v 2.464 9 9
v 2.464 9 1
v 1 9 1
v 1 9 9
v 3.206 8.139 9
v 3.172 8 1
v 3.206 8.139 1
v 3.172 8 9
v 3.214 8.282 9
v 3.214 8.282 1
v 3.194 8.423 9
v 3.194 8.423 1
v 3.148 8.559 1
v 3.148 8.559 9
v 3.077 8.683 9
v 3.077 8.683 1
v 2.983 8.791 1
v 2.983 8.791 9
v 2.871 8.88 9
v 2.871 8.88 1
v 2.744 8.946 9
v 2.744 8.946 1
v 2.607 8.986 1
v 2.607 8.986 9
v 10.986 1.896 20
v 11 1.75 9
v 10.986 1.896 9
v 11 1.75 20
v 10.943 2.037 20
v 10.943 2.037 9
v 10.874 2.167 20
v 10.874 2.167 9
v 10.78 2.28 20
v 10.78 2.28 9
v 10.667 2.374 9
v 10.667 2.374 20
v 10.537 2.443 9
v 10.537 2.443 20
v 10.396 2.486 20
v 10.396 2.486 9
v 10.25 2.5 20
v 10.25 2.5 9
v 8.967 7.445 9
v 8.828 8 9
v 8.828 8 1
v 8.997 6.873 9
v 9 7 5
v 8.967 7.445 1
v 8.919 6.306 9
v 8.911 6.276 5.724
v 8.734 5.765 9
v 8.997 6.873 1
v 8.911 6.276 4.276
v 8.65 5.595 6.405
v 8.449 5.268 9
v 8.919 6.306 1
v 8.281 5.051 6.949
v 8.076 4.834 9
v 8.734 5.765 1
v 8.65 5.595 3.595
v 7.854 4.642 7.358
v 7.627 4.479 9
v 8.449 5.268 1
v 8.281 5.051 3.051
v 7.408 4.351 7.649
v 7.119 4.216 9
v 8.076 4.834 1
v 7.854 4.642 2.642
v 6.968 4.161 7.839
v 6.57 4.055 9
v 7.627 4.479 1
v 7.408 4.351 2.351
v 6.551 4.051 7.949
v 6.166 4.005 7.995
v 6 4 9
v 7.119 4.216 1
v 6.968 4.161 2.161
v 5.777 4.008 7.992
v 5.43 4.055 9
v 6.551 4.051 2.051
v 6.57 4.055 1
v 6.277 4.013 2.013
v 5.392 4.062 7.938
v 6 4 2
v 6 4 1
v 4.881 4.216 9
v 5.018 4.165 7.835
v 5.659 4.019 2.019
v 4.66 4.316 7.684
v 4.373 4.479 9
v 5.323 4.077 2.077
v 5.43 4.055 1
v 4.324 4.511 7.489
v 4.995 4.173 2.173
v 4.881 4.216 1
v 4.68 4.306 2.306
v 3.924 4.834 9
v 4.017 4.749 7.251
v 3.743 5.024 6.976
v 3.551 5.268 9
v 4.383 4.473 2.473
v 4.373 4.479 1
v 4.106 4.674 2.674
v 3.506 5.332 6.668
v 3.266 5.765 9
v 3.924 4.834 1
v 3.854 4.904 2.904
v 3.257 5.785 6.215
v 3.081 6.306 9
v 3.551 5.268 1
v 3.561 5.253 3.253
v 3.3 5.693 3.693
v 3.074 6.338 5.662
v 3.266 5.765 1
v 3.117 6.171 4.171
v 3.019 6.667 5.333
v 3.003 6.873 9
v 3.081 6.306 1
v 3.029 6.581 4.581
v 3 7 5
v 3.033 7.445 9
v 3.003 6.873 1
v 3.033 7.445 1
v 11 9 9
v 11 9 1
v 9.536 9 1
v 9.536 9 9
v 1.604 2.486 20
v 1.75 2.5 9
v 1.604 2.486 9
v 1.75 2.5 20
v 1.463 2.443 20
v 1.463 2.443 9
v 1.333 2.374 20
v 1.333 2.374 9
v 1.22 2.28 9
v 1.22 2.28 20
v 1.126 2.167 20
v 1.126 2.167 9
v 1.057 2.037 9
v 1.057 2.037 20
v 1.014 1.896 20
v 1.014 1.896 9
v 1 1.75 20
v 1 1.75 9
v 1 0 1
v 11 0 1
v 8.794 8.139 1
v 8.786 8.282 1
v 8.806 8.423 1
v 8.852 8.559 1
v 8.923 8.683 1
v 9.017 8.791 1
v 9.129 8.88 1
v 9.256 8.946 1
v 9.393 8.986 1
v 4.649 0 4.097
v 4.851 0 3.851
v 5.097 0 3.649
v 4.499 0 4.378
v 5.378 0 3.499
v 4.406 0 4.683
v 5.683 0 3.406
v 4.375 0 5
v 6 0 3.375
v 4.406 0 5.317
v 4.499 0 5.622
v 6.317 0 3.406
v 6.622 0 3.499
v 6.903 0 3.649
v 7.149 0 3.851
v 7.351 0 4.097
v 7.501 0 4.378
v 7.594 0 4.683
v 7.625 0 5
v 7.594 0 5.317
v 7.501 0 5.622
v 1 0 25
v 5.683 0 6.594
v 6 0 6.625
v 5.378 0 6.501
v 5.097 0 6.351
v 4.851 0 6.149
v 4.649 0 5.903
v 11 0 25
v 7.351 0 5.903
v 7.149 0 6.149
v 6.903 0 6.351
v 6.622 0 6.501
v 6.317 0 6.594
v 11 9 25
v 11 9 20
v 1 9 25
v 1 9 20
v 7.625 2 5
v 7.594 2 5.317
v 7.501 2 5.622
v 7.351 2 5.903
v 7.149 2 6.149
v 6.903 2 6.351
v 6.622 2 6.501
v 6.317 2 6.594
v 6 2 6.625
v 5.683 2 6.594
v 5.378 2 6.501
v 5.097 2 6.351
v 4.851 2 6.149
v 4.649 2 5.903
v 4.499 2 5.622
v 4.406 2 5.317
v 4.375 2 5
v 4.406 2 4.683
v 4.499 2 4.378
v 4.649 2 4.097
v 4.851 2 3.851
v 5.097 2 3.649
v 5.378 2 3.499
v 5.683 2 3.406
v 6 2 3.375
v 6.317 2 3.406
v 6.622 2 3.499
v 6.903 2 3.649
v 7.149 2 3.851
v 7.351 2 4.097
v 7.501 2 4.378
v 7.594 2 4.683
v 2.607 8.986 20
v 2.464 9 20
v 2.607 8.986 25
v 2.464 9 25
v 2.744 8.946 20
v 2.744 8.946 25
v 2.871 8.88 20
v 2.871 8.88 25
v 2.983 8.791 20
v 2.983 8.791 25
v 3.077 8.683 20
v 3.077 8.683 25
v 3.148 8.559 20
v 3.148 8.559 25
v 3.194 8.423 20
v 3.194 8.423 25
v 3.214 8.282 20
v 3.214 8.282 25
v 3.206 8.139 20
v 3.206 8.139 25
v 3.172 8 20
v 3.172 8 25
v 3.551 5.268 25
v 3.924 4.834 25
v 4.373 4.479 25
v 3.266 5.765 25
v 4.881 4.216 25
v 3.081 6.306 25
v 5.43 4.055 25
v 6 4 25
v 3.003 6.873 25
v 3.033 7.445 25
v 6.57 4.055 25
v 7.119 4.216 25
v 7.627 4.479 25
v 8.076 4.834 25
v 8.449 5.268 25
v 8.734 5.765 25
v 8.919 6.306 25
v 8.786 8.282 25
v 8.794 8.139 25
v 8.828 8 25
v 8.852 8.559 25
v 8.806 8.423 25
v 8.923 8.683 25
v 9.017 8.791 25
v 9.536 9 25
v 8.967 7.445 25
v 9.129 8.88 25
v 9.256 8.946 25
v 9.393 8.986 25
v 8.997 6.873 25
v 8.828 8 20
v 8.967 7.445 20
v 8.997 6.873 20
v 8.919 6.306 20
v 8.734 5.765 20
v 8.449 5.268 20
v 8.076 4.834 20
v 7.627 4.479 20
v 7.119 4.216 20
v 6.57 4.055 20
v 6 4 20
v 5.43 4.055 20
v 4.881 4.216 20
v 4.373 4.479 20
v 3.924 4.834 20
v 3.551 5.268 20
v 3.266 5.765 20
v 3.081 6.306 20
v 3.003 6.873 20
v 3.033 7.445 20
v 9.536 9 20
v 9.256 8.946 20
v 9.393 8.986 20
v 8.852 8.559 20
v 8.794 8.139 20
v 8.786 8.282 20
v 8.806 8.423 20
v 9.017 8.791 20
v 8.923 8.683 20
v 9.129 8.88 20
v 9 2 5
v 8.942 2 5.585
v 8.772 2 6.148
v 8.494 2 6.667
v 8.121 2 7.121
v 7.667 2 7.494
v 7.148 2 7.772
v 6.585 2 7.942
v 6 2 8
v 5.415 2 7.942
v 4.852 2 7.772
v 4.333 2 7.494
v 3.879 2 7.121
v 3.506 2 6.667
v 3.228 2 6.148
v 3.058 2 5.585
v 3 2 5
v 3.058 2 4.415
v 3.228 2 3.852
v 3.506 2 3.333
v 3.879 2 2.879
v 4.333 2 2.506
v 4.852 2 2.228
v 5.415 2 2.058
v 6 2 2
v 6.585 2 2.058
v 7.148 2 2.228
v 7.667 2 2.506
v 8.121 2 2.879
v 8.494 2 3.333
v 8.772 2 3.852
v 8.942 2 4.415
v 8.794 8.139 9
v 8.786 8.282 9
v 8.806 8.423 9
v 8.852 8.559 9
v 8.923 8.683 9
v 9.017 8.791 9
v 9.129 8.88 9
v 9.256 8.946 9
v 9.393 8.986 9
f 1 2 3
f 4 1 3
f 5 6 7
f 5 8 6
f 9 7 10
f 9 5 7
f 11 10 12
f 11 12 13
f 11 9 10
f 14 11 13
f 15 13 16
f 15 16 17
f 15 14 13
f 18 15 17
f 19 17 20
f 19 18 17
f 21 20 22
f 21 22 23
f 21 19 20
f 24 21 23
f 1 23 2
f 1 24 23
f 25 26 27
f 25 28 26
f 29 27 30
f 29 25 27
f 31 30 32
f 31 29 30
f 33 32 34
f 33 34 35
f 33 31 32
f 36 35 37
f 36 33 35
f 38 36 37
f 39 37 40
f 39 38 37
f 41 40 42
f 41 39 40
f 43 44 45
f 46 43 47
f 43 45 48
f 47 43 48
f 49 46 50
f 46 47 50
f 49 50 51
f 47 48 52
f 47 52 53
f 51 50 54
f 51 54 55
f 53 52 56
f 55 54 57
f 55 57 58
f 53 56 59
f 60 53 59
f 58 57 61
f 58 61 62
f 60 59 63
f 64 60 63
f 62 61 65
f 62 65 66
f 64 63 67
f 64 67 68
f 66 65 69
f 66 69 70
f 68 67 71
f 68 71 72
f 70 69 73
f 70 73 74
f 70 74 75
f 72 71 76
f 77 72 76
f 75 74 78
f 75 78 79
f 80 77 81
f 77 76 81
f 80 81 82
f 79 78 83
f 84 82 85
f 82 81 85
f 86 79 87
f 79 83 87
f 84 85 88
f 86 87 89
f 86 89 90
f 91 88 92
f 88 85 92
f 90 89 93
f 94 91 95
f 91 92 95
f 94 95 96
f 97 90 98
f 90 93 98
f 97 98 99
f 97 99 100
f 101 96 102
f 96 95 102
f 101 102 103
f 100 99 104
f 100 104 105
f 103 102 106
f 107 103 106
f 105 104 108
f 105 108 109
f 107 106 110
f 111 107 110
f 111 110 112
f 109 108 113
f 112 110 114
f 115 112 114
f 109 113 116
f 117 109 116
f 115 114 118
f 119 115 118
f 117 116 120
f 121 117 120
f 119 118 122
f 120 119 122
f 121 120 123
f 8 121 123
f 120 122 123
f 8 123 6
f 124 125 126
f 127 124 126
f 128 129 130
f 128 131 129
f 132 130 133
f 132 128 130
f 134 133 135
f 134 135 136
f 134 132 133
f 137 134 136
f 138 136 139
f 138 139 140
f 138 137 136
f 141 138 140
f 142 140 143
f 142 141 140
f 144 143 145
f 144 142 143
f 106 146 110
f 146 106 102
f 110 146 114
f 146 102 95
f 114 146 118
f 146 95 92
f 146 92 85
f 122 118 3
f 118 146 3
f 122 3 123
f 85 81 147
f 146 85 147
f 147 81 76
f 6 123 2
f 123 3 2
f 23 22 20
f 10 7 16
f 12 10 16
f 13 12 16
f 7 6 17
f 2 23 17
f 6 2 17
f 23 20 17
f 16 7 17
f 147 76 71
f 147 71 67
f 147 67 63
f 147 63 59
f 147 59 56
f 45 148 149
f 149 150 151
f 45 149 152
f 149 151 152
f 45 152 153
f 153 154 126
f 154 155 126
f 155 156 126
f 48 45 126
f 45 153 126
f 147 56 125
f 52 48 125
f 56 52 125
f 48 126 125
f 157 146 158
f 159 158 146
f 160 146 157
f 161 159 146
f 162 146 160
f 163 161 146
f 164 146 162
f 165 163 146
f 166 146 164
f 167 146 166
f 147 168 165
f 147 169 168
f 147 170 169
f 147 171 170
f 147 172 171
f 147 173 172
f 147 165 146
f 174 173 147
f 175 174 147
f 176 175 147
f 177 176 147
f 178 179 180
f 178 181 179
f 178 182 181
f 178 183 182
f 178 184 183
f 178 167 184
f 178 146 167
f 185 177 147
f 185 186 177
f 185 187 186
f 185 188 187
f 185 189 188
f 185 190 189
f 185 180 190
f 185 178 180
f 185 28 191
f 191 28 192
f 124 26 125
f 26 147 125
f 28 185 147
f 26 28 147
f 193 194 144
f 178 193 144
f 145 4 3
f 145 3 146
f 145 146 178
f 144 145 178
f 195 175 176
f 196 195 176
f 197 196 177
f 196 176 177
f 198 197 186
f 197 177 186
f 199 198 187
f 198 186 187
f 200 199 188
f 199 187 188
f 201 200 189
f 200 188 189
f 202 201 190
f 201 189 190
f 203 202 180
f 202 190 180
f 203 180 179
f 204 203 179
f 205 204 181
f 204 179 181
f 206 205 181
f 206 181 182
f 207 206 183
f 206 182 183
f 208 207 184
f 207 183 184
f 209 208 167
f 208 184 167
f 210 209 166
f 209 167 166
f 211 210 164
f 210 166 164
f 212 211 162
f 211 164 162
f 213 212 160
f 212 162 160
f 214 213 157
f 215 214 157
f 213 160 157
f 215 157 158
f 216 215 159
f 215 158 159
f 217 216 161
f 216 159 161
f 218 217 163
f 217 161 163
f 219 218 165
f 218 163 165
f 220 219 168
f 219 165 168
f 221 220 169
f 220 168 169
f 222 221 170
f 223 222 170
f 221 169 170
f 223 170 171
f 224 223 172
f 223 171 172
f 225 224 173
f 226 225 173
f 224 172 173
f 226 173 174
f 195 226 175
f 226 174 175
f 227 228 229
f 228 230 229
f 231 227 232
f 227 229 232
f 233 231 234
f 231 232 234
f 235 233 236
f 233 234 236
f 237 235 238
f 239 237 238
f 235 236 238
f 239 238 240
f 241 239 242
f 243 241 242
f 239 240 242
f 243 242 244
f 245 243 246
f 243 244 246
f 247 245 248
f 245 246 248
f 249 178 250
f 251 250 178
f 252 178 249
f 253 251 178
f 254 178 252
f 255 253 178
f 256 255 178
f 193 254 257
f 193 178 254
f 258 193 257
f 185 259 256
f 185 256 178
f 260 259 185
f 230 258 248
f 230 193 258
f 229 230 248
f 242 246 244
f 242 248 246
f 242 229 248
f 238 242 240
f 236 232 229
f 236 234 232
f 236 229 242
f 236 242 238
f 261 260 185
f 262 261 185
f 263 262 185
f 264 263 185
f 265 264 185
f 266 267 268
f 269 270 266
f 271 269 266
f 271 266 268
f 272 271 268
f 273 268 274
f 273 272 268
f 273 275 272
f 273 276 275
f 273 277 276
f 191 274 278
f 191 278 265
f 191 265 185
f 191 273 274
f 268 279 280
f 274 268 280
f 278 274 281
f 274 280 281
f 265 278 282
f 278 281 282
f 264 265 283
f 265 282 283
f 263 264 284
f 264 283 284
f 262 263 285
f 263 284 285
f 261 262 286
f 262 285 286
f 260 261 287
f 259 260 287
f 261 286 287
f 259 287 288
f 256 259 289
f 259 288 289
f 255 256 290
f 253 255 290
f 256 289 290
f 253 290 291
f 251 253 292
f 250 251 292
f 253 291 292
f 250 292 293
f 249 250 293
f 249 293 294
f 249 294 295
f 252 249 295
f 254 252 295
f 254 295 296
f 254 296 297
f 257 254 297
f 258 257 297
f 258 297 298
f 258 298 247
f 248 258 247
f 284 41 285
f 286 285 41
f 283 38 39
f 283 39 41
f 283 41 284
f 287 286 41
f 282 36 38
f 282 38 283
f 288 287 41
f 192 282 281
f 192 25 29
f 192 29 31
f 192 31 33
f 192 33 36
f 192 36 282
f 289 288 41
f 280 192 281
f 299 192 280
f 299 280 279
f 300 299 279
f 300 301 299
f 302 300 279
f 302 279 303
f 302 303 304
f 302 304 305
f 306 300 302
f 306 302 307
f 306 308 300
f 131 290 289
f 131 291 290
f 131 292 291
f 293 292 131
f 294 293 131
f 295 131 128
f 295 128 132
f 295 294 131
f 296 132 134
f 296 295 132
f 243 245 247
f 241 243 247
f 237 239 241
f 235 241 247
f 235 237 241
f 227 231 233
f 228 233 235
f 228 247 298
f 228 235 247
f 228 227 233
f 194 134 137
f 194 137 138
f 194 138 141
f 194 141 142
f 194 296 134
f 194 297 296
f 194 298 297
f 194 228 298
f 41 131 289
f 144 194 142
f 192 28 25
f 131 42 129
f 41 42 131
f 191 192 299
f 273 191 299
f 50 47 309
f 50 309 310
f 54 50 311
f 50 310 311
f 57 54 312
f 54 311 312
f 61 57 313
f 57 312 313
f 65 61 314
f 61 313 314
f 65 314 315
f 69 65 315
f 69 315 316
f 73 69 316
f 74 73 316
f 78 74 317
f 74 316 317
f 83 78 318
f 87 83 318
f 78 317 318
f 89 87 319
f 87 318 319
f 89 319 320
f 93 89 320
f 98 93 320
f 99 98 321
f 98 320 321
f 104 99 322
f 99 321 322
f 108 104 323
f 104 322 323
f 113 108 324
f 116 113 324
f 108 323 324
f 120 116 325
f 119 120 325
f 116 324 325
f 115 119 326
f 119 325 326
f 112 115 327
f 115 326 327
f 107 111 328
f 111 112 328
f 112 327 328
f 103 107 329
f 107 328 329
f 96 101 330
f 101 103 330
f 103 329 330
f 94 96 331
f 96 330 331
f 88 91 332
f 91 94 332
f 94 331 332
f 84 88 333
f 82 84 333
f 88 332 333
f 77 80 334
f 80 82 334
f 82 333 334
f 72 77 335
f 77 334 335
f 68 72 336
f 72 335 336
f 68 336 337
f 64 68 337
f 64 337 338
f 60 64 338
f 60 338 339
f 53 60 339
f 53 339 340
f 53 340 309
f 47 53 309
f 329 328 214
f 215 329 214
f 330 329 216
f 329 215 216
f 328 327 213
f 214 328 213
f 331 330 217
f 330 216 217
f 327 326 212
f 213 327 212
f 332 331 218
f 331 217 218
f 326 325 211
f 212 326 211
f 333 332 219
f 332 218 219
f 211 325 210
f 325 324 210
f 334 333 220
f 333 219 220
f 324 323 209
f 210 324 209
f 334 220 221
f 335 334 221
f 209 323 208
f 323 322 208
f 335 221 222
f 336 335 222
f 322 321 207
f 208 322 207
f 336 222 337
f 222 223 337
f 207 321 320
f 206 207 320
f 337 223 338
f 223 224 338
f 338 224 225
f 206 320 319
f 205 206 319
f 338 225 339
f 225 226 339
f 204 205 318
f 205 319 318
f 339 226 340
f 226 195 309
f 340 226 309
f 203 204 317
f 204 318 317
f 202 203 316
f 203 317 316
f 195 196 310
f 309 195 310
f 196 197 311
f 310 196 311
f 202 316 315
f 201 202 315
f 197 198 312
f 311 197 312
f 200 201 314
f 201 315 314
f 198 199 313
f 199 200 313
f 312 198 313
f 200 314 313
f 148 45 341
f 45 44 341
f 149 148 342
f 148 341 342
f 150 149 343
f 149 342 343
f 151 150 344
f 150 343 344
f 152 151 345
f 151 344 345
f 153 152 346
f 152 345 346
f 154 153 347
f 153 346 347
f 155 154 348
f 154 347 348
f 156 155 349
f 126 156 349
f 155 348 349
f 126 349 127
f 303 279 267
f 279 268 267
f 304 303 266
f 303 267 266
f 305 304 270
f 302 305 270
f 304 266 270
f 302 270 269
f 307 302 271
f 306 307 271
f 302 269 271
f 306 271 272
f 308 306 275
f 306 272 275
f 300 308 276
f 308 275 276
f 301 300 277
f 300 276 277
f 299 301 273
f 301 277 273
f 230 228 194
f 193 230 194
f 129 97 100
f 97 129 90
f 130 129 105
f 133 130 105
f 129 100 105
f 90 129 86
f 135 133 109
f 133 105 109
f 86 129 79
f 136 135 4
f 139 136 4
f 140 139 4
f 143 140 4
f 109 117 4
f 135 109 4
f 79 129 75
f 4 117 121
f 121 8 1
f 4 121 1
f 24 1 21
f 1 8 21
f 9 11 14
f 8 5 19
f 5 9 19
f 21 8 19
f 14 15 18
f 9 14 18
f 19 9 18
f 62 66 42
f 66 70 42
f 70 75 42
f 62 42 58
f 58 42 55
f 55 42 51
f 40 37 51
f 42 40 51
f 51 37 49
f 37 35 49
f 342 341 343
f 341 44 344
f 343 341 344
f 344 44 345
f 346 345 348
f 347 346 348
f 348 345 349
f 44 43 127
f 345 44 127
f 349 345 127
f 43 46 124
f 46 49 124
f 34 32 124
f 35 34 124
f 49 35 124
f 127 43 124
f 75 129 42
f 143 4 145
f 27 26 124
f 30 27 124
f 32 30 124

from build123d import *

# Parameters (mm, degrees)
F1_DEPTH  = 25
F2_DEPTH  = 1
F3_DEPTH  = 1
F4_W      = 6
F4_H      = 11
F4_H_2    = 1
F5_DEPTH  = 25
F6_R      = 3
F6_R_2    = 1.625
F7_DEPTH  = 7
F8_DEPTH  = 2
F9_DEPTH  = 1
F10_R     = 0.75
F11_DEPTH = 0.5
F12_R     = 0.75


with BuildPart() as f1:
    # F0 (on Top) → F1 (new body)
    with BuildSketch(Plane.XY):
        with BuildLine():
            Line((0, 9), (0, 0))
            Line((0, 0), (12, 0))
            Line((12, 0), (12, 9))
            Line((12, 9), (8.2360679775, 9))
            ThreePointArc((8.2360679775, 9), (6, 4), (3.7639320225, 9))
            Line((3.7639320225, 9), (0, 9))
        make_face()
    extrude(amount=F1_DEPTH)

    # F2 (cut): a face of the model
    f2_faces = [f1.faces().sort_by_distance(p)[0] for p in [
        (0, 4.5, 12.5),
    ]]
    extrude(f2_faces, amount=-F2_DEPTH, mode=Mode.SUBTRACT)

    # F3 (cut): a face of the model
    f3_faces = [f1.faces().sort_by_distance(p)[0] for p in [
        (12, 4.5, 12.5),
    ]]
    extrude(f3_faces, amount=-F3_DEPTH, mode=Mode.SUBTRACT)

    # F4 (on face) → F5 (cut)
    with BuildSketch(Plane.YZ.offset(11)):
        with Locations((6, 14.5)):
            Rectangle(F4_W, F4_H)
        with Locations((6, 0.5)):
            Rectangle(F4_W, F4_H_2)
    extrude(amount=-F5_DEPTH, mode=Mode.SUBTRACT)

    # F6 (on face) → F7 (cut)
    with BuildSketch(Plane.XZ):
        with Locations((6, 5)):
            Circle(F6_R)
        with Locations((6, 5)):
            Circle(F6_R_2, mode=Mode.SUBTRACT)
        with Locations((6, 5)):
            Circle(F6_R_2)
    extrude(amount=-F7_DEPTH, mode=Mode.SUBTRACT)

    # F6 (on face) → F8 (join)
    with BuildSketch(Plane.XZ):
        with Locations((6, 5)):
            Circle(F6_R)
        with Locations((6, 5)):
            Circle(F6_R_2, mode=Mode.SUBTRACT)
    extrude(amount=-F8_DEPTH)

    # F9 (cut): a face of the model
    f9_faces = [f1.faces().sort_by_distance(p)[0] for p in [
        (6, 1.5, 0),
    ]]
    extrude(f9_faces, amount=-F9_DEPTH, mode=Mode.SUBTRACT)

    # F10
    f10_edges = [f1.edges().sort_by_distance(p)[0] for p in [
        (8.236068, 9, 5),
        (3.763932, 9, 5),
        (3.763932, 9, 22.5),
        (8.236068, 9, 22.5),
    ]]
    fillet(f10_edges, radius=F10_R)

    # F11 (cut): a face of the model
    f11_faces = [f1.faces().sort_by_distance(p)[0] for p in [
        (6, 3, 14.5),
    ]]
    extrude(f11_faces, amount=-F11_DEPTH, mode=Mode.SUBTRACT)

    # F12
    f12_edges = [f1.edges().sort_by_distance(p)[0] for p in [
        (11, 2.5, 14.5),
        (1, 2.5, 14.5),
    ]]
    fillet(f12_edges, radius=F12_R)


solid = f1.part
